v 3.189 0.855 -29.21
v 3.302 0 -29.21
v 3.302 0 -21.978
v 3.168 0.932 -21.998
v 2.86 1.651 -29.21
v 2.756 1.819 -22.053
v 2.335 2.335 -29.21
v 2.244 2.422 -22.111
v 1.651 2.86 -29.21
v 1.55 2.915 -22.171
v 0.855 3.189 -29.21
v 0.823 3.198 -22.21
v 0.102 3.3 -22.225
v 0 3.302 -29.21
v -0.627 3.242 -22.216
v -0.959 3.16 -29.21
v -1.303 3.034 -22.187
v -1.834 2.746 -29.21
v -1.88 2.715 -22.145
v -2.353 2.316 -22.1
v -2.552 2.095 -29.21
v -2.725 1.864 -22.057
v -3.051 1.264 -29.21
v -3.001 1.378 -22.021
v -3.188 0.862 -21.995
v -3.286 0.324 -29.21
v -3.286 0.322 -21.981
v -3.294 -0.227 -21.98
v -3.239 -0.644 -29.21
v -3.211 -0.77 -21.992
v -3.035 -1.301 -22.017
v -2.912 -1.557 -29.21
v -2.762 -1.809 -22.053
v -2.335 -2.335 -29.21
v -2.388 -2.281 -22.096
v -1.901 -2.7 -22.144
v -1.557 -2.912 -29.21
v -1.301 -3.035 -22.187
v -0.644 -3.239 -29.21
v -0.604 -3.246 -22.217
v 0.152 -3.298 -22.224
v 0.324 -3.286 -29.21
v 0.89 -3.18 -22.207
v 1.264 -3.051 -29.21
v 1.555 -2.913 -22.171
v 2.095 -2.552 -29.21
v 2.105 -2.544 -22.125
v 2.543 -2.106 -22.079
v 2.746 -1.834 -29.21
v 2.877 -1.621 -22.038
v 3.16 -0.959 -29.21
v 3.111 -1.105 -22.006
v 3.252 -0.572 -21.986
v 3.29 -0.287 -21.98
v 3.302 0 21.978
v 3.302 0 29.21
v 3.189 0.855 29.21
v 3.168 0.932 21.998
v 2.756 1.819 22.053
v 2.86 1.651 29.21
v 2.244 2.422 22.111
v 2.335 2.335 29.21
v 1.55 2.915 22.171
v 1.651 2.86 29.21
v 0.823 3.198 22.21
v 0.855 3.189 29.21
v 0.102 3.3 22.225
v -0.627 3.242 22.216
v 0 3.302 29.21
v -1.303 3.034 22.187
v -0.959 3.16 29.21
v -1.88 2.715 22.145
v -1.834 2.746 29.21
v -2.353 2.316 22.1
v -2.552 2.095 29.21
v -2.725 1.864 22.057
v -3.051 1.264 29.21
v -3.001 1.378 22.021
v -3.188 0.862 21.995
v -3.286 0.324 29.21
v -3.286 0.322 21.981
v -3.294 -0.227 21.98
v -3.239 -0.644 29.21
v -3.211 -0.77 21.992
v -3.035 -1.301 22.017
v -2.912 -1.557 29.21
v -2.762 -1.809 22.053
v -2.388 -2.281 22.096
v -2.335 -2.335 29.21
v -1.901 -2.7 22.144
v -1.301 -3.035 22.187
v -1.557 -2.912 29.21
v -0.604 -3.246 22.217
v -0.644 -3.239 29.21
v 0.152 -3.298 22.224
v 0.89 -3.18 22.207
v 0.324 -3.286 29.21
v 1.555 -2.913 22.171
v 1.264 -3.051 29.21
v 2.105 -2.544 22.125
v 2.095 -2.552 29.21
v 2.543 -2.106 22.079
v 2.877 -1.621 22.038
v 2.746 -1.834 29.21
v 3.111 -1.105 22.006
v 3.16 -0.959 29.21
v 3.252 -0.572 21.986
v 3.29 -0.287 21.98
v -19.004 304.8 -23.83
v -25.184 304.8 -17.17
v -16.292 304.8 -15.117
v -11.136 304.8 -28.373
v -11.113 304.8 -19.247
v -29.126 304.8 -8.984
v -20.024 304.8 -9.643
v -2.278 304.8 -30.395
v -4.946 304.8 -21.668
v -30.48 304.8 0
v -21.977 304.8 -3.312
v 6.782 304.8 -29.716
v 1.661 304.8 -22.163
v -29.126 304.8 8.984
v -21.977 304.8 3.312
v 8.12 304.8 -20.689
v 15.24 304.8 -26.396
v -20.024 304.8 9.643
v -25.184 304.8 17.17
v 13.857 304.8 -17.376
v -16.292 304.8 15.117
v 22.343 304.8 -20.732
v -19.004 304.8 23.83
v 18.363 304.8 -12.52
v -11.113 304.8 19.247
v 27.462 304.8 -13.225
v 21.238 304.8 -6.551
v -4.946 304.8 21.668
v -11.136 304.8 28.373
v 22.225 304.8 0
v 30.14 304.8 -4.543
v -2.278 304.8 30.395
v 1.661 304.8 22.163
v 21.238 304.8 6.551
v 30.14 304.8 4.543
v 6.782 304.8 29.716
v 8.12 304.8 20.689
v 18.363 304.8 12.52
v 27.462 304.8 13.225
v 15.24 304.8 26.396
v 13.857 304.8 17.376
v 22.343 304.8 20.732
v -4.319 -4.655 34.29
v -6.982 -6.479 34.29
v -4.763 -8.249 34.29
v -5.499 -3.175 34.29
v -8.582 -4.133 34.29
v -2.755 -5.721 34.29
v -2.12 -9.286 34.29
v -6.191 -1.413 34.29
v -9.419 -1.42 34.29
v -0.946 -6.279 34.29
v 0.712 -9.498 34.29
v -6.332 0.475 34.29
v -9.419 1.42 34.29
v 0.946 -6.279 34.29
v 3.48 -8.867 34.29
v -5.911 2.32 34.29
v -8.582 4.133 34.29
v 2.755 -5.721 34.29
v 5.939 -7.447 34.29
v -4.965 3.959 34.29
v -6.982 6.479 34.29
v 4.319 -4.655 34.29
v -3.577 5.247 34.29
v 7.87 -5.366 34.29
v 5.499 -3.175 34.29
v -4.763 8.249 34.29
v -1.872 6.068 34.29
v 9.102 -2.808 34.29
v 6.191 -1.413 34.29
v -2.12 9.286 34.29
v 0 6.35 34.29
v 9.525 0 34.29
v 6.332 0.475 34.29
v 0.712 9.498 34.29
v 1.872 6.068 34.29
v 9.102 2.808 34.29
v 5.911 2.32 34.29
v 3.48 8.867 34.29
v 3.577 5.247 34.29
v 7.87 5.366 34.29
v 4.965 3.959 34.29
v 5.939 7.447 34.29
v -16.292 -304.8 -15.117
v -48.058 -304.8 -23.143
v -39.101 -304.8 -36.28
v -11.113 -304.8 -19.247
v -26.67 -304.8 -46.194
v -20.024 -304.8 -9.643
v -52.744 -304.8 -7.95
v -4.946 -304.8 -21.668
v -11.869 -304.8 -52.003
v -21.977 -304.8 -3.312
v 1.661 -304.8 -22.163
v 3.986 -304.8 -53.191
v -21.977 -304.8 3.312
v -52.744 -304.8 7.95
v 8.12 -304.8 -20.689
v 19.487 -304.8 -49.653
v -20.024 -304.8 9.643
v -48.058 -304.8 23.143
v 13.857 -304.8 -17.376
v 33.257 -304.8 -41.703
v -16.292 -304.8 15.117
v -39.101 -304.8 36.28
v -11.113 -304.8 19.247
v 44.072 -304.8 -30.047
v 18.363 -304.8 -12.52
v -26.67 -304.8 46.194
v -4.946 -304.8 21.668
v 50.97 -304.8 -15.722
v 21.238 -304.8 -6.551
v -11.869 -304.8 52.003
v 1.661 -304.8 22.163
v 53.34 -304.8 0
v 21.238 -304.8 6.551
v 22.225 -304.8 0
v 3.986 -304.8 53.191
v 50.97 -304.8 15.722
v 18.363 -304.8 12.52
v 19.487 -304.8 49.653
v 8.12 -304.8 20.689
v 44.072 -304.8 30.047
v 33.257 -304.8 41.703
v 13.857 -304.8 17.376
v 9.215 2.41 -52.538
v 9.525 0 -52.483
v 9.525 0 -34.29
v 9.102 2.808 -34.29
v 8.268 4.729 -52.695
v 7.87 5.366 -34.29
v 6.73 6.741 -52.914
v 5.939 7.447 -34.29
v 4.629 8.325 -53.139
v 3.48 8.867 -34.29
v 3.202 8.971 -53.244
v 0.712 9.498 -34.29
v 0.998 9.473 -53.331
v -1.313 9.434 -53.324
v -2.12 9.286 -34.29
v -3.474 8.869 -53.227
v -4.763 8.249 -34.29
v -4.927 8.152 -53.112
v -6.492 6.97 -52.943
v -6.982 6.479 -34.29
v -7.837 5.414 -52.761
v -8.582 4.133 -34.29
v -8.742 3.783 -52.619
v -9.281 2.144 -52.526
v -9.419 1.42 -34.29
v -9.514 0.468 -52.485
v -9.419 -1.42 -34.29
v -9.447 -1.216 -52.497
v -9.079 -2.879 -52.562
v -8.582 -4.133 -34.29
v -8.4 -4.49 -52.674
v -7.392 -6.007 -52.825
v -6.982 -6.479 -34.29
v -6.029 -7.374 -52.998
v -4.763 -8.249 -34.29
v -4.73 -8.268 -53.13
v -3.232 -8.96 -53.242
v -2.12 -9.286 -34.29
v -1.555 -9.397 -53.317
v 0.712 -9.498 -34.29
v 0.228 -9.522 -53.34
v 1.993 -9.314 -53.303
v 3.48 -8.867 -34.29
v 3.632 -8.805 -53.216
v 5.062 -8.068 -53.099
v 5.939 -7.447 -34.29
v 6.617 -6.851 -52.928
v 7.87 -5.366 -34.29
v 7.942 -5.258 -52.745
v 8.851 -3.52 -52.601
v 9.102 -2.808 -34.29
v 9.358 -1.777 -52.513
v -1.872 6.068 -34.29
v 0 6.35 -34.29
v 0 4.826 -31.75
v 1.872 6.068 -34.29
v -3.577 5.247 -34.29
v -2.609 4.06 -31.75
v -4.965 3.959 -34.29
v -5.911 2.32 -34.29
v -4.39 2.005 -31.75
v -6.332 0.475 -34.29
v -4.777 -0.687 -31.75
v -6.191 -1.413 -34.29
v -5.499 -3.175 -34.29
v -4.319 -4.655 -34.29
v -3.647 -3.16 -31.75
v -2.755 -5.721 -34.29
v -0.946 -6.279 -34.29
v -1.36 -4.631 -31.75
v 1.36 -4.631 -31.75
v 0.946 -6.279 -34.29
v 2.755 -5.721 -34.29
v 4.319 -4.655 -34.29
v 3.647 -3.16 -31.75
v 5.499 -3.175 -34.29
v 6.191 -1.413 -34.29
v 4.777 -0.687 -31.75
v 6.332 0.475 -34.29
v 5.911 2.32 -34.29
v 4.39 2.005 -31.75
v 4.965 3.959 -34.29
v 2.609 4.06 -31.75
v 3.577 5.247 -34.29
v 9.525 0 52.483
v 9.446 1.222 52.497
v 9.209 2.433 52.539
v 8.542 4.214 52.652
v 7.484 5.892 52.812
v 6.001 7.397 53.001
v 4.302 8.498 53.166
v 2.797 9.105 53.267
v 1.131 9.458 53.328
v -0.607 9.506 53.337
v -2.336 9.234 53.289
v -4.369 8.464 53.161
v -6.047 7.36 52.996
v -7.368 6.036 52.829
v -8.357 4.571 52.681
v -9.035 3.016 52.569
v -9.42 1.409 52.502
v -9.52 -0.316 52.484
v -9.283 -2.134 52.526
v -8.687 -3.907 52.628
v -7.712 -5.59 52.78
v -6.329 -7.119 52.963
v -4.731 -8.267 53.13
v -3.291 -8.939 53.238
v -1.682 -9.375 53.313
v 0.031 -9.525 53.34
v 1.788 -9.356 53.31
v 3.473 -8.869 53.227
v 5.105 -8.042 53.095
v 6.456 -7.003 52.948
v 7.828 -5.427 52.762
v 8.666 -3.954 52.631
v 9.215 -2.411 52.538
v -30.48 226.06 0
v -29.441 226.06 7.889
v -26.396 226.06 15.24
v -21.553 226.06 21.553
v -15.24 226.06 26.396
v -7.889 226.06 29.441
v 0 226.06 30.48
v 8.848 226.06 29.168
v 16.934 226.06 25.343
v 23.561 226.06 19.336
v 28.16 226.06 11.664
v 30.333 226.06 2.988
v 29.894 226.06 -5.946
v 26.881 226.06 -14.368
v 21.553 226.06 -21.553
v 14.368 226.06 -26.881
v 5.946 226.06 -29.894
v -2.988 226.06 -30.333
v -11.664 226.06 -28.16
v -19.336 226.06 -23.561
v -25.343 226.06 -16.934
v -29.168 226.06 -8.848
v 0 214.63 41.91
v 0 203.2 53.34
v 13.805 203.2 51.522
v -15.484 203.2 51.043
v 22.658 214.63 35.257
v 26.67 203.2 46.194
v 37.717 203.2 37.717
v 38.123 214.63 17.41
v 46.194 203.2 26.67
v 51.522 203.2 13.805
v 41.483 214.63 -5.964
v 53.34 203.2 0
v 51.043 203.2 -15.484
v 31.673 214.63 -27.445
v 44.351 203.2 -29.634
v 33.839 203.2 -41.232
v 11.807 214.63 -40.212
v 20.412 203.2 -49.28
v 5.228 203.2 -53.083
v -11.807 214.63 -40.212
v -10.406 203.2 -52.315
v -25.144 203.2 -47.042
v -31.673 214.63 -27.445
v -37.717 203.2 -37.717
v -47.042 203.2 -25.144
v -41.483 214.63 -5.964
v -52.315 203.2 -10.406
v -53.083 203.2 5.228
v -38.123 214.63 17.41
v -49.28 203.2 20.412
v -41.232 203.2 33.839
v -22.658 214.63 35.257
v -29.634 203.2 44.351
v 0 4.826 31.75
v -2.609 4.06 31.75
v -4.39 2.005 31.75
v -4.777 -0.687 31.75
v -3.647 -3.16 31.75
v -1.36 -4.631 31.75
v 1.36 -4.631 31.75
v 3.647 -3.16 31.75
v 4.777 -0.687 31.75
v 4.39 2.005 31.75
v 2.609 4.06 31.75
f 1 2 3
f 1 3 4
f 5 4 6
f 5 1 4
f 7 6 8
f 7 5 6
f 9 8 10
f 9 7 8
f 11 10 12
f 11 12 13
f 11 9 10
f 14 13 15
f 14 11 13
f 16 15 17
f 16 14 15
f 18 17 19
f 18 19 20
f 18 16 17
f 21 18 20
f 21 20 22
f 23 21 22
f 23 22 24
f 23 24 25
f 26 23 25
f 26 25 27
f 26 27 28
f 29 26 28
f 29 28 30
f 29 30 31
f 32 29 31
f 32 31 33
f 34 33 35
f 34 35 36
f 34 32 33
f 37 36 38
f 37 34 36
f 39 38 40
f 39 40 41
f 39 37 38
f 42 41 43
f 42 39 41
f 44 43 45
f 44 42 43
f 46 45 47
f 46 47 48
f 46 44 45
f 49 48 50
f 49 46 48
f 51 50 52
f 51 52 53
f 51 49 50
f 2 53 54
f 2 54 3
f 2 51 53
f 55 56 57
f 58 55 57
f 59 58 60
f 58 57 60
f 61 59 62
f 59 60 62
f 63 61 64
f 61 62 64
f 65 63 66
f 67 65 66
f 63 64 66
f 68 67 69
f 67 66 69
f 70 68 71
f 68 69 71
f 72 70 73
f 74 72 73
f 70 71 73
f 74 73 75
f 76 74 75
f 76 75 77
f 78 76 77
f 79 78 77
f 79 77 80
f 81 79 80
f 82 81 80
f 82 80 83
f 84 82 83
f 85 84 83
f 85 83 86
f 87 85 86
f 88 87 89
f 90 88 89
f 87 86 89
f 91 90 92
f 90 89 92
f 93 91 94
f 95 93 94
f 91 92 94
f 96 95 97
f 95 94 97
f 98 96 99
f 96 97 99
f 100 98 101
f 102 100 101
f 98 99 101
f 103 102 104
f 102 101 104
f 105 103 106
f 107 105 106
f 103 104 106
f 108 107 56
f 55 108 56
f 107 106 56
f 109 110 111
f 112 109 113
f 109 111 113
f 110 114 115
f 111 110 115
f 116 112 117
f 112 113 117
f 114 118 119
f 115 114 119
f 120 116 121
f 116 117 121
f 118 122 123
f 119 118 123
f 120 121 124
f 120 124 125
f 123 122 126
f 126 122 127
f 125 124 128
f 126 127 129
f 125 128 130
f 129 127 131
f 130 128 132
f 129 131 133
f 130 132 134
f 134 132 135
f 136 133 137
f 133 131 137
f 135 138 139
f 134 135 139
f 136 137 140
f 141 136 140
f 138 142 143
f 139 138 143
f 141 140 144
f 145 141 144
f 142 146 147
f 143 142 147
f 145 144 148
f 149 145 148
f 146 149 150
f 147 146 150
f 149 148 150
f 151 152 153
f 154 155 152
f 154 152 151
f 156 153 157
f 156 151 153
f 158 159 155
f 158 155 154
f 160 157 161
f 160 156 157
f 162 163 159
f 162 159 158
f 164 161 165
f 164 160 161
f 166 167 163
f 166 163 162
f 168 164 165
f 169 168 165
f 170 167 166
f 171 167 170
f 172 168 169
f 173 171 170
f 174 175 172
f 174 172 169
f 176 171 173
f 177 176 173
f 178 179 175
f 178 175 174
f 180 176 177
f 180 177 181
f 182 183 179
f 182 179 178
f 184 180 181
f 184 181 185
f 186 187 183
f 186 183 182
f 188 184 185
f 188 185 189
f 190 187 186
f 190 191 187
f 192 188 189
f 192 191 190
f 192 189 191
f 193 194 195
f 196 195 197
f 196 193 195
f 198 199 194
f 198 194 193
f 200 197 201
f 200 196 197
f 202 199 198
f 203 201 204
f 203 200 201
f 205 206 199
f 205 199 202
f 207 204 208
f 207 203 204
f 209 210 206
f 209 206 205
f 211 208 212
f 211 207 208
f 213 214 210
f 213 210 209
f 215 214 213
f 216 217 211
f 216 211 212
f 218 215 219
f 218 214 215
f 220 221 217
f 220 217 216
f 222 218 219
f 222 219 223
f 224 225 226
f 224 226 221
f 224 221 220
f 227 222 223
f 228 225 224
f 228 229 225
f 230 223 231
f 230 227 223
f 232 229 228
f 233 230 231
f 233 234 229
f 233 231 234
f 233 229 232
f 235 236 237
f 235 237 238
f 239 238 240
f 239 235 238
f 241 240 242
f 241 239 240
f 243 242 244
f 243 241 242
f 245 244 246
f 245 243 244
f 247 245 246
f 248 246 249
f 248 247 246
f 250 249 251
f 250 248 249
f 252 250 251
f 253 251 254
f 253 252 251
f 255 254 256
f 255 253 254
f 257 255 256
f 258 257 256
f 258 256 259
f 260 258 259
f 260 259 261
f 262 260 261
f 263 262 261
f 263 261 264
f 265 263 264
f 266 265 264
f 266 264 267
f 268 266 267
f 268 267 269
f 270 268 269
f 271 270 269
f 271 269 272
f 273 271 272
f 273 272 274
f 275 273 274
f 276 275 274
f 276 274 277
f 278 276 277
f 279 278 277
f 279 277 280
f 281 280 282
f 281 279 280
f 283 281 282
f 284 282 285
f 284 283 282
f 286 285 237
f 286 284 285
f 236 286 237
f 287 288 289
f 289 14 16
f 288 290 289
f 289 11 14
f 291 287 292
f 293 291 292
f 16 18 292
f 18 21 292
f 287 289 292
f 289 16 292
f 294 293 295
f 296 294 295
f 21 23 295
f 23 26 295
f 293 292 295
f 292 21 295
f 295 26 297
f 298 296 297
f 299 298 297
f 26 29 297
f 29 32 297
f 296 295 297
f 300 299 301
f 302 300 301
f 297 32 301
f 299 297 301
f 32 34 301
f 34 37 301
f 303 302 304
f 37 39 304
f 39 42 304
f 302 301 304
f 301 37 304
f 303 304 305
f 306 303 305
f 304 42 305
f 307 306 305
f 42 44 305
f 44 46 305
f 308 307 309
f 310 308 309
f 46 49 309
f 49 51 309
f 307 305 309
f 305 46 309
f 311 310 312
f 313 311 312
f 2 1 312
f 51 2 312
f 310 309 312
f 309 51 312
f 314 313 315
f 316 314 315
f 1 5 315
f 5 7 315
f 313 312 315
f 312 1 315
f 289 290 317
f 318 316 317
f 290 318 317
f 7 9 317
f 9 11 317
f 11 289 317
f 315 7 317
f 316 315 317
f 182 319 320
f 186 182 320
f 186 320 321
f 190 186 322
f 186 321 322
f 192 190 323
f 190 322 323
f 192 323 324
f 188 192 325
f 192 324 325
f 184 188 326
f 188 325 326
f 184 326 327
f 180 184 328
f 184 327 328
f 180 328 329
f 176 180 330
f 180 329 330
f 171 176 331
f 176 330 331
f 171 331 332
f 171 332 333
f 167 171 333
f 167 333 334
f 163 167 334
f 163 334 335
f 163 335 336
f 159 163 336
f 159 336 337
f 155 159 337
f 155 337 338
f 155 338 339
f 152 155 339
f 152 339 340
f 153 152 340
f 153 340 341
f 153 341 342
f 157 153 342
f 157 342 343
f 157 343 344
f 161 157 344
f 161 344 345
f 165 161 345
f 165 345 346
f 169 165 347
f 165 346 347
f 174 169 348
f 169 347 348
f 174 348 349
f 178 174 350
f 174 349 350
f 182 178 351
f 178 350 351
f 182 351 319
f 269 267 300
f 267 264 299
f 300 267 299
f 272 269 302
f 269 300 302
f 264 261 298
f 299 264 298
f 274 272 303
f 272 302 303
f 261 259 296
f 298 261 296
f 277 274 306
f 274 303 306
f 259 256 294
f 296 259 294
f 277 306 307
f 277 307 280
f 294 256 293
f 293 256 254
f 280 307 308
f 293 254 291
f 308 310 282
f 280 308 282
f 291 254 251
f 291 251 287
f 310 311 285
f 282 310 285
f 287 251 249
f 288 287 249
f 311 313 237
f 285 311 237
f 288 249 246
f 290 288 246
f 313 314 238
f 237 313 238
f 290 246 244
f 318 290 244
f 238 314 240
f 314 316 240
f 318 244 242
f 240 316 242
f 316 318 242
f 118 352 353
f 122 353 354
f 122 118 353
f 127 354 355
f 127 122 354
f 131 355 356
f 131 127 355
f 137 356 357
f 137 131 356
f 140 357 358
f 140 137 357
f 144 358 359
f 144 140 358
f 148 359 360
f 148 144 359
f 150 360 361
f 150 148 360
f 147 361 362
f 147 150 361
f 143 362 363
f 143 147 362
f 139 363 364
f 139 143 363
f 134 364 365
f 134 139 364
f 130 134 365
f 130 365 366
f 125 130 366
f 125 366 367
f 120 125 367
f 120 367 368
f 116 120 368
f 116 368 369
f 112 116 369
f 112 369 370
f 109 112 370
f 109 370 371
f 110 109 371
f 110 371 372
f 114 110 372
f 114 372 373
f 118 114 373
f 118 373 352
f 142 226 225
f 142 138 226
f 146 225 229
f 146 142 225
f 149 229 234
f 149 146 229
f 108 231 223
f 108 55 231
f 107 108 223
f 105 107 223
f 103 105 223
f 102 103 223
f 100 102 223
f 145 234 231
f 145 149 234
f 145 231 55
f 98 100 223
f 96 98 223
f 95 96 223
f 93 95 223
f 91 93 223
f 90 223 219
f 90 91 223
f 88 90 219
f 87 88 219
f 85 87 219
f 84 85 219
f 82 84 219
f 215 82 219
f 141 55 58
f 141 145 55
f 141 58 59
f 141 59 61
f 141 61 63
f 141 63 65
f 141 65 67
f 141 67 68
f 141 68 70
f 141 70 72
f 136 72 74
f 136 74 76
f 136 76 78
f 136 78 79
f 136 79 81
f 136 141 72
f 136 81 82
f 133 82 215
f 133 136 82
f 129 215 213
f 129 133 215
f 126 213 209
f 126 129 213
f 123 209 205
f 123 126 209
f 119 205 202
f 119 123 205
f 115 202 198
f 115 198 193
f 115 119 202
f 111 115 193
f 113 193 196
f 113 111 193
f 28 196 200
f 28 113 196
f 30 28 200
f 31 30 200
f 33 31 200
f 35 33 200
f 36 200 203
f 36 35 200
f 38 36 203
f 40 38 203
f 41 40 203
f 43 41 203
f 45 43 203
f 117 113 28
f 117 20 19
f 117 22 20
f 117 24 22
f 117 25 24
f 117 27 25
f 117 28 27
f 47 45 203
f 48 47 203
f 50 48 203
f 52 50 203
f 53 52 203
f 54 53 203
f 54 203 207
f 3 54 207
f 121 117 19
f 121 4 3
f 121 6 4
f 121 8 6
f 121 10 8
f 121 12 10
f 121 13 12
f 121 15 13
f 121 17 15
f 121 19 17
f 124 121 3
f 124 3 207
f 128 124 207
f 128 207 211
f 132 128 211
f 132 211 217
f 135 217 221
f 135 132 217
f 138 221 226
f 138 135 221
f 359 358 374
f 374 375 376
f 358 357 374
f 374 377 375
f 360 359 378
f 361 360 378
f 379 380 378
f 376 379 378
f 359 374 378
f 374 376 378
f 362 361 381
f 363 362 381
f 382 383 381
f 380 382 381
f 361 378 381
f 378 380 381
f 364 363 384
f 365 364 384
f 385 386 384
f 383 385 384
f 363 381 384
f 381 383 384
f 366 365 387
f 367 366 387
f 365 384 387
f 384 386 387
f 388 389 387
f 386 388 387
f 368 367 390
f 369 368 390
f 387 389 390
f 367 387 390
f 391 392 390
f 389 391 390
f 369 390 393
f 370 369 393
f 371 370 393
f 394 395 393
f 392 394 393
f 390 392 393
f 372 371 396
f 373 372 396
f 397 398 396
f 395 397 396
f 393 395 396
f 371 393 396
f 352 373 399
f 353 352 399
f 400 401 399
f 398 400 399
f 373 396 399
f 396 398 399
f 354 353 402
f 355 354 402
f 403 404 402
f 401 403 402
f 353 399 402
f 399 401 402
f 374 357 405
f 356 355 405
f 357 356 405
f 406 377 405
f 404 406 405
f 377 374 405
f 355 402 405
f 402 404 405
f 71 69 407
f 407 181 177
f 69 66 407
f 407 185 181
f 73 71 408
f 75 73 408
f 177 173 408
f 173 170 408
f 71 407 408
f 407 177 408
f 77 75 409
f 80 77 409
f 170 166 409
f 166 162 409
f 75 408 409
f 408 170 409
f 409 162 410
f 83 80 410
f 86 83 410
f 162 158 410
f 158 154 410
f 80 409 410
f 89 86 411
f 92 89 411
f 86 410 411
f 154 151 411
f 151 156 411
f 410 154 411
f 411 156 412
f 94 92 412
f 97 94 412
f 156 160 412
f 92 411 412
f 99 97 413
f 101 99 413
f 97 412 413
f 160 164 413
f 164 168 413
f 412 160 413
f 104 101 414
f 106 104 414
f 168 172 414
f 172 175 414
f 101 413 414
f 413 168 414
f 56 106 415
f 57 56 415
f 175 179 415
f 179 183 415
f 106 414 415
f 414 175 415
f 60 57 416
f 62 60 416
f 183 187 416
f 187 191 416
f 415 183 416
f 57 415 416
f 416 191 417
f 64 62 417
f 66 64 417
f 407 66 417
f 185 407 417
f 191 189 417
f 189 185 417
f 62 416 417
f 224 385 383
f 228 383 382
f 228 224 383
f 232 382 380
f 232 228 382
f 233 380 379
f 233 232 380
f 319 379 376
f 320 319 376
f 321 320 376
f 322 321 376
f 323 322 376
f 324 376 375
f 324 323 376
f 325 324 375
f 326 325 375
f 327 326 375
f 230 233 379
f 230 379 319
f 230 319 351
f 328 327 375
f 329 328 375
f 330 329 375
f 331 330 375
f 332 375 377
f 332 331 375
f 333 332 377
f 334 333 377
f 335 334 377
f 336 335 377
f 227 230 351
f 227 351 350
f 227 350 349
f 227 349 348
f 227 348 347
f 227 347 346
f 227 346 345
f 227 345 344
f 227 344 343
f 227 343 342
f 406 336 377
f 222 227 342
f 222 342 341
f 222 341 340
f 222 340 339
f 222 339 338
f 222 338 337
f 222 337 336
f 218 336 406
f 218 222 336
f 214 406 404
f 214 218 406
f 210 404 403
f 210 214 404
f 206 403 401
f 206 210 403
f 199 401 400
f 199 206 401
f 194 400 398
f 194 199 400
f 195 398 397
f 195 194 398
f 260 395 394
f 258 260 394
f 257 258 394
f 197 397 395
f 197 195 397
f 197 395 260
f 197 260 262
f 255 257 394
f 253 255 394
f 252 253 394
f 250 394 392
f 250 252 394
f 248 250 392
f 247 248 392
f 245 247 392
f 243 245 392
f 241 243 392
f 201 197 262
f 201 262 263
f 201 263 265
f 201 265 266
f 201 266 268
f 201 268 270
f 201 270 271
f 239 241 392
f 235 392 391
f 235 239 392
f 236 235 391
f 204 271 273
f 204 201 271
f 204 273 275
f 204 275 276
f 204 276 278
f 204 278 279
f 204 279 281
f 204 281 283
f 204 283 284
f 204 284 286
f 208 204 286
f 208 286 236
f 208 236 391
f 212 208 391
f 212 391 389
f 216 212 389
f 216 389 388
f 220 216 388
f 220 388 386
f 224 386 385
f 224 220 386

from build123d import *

# Parameters (mm, degrees)
F0_R      = 53.34
F0_R_2    = 22.225
F1_DEPTH  = 304.8
F4_R      = 53.34
F4_R_2    = 30.48
F5_DEPTH  = 101.6
F10_R     = 9.525
F10_R_2   = 3.302
F11_DEPTH = 19.05
F12_DEPTH = 32.3616602869
F13_R     = 9.525
F13_R_2   = 3.302
F14_DEPTH = 19.05
F15_DEPTH = 32.3616602869


with BuildPart() as f1:
    # F0 (on Front) → F1 (new body, symmetric)
    with BuildSketch(Plane.XZ):
        Circle(F0_R)
        Circle(F0_R_2, mode=Mode.SUBTRACT)
    extrude(amount=F1_DEPTH, both=True)

    # F4 (on offset) → F5 (cut)
    with BuildSketch(Plane(origin=(0, 304.8, 0), x_dir=(-1, 0, 0), z_dir=(0, 1, 0))):
        Circle(F4_R)
        Circle(F4_R_2, mode=Mode.SUBTRACT)
    extrude(amount=-F5_DEPTH, mode=Mode.SUBTRACT)

    # F6 (on Right) → F7 (revolve)
    with BuildSketch(Plane.YZ):
        Polygon((203.2, 53.34), (203.2, 30.48), (226.06, 30.48), align=None)
    revolve(axis=Axis((0, 101.6, 0), (0, 1, 0)))

    # F10 (on offset) → F11 (cut)
    with BuildSketch(Plane.XY.offset(53.34)):
        Circle(F10_R)
        Circle(F10_R_2, mode=Mode.SUBTRACT)
        Circle(F10_R_2)
    extrude(amount=-F11_DEPTH, mode=Mode.SUBTRACT)

    # F10 (on offset) → F12 (cut, up to face)
    with BuildSketch(Plane.XY.offset(53.34)):
        Circle(F10_R_2)
    extrude(amount=-F12_DEPTH, mode=Mode.SUBTRACT)

    # F13 (on offset) → F14 (cut)
    with BuildSketch(Plane.XY.offset(-53.34)):
        Circle(F13_R)
        Circle(F13_R_2, mode=Mode.SUBTRACT)
        Circle(F13_R_2)
    extrude(amount=F14_DEPTH, mode=Mode.SUBTRACT)

    # F13 (on offset) → F15 (cut, up to face)
    with BuildSketch(Plane.XY.offset(-53.34)):
        Circle(F13_R_2)
    extrude(amount=F15_DEPTH, mode=Mode.SUBTRACT)

    # F16 (on Right) → F17 (revolve, cut)
    with BuildSketch(Plane.YZ):
        Polygon((6.35, 34.29), (3.302, 34.29), (3.302, 29.21), align=None)
        Polygon((6.35, -34.29), (3.302, -29.21), (3.302, -34.29), align=None)
    revolve(axis=Axis((0, 0, 17.145), (0, 0, 1)), mode=Mode.SUBTRACT)


solid = f1.part
